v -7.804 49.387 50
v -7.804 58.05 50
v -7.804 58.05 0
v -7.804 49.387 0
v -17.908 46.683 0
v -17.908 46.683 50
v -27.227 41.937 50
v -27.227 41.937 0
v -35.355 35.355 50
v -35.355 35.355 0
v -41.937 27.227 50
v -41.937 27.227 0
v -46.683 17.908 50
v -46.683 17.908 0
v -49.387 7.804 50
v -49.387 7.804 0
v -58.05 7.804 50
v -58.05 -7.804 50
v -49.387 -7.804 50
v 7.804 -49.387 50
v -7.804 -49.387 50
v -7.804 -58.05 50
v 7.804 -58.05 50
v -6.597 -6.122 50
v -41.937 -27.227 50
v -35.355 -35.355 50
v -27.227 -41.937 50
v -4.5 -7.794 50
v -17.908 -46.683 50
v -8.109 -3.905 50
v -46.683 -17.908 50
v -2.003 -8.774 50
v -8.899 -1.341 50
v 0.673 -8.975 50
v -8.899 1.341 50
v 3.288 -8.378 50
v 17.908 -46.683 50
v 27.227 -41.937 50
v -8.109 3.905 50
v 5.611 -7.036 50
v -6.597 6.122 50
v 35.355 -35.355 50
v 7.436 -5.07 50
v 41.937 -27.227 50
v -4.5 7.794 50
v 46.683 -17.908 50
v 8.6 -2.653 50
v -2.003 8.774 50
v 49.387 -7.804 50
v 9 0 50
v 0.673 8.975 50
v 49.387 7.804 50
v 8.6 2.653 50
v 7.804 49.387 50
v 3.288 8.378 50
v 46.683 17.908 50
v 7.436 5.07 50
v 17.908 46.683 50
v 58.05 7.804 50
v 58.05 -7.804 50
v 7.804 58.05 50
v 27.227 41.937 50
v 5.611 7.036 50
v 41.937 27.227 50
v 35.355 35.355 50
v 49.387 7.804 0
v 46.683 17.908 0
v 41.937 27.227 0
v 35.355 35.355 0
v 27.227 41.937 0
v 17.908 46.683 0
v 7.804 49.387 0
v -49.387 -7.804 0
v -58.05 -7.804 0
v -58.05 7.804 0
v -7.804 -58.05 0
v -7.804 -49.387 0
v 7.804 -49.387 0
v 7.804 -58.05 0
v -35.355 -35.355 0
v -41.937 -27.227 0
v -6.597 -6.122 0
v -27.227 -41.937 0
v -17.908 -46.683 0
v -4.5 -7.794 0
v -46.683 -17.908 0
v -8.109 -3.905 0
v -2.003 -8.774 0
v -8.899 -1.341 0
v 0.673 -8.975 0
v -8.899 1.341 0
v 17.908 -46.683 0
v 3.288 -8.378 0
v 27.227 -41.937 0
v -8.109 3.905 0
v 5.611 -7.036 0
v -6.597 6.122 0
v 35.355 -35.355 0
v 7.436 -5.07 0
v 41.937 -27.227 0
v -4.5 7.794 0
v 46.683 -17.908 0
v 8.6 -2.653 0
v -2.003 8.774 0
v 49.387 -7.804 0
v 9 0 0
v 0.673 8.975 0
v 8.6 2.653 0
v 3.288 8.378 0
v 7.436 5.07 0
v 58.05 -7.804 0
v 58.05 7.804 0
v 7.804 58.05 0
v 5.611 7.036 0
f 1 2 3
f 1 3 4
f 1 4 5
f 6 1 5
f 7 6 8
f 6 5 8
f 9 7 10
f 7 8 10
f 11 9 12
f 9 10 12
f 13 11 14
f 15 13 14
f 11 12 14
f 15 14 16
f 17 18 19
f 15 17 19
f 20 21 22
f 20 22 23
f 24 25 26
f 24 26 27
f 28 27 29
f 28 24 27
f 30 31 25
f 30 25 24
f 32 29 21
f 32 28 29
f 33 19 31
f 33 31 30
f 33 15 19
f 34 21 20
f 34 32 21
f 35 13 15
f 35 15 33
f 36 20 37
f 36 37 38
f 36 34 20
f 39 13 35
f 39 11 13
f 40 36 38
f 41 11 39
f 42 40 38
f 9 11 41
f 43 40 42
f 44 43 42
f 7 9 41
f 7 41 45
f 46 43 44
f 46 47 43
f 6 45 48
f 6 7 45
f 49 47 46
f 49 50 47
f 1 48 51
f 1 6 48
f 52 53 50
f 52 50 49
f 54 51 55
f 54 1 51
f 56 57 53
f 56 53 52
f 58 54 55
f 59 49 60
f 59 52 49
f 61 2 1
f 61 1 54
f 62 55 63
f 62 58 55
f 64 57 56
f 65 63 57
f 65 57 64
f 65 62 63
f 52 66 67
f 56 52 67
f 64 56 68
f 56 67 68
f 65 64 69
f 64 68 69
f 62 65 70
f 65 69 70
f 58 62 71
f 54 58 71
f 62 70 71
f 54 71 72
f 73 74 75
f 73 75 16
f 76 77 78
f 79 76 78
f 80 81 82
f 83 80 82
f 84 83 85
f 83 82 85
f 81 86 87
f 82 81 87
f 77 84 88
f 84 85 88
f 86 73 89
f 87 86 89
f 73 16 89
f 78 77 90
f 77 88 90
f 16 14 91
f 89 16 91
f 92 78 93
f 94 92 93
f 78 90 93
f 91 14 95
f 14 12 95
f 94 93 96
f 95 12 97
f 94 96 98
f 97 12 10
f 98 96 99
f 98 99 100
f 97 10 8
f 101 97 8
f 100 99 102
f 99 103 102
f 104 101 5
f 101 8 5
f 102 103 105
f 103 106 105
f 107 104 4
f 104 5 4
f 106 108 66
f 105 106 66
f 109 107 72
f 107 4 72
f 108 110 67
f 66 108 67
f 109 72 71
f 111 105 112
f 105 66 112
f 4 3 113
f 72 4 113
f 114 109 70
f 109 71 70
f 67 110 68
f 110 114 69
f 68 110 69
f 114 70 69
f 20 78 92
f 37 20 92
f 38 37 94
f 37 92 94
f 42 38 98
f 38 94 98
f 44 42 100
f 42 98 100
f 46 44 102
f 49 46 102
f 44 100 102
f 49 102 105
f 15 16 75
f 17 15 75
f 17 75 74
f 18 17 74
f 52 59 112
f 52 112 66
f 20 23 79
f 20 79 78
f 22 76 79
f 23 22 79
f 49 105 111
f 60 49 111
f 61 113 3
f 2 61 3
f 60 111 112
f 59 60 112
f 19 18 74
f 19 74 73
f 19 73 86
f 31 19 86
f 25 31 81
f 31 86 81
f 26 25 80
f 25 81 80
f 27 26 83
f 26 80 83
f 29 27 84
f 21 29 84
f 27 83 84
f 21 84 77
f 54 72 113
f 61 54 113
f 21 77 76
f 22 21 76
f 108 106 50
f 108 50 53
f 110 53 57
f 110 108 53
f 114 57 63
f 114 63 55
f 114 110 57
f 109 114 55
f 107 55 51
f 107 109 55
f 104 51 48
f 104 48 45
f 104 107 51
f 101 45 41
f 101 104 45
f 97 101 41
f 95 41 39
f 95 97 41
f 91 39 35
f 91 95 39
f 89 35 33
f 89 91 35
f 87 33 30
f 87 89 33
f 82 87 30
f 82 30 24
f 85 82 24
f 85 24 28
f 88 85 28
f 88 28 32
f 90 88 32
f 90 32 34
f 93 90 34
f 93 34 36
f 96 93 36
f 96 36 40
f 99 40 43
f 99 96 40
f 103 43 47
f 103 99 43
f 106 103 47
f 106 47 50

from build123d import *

# Parameters (mm, degrees)
F0_R     = 9
F1_DEPTH = 50


with BuildPart() as f1:
    # F0 (on Top) → F1 (new body)
    with BuildSketch(Plane.XY):
        with BuildLine():
            ThreePointArc((49.38715, -7.804448), (49.846552, -3.914237), (50, 0))
            ThreePointArc((50, 0), (49.846552, 3.914237), (49.38715, 7.804448))
            ThreePointArc((49.38715, 7.804448), (35.355339, 35.355339), (7.804448, 49.38715))
            ThreePointArc((7.804448, 49.38715), (0, 50), (-7.804448, 49.38715))
            ThreePointArc((-7.804448, 49.38715), (-35.355339, 35.355339), (-49.38715, 7.804448))
            ThreePointArc((-49.38715, 7.804448), (-50, 0), (-49.38715, -7.804448))
            ThreePointArc((-49.38715, -7.804448), (-35.355339, -35.355339), (-7.804448, -49.38715))
            ThreePointArc((-7.804448, -49.38715), (0, -50), (7.804448, -49.38715))
            ThreePointArc((7.804448, -49.38715), (35.355339, -35.355339), (49.38715, -7.804448))
        make_face()
        Circle(F0_R, mode=Mode.SUBTRACT)
        with BuildLine():
            ThreePointArc((-7.804448, 49.38715), (0, 50), (7.804448, 49.38715))
            Line((7.804448, 49.38715), (7.804448, 58.050208))
            Line((7.804448, 58.050208), (-7.804448, 58.050208))
            Line((-7.804448, 58.050208), (-7.804448, 49.38715))
        make_face()
        with BuildLine():
            ThreePointArc((49.38715, 7.804448), (49.846552, 3.914237), (50, 0))
            ThreePointArc((50, 0), (49.846552, -3.914237), (49.38715, -7.804448))
            Line((49.38715, -7.804448), (58.050208, -7.804448))
            Line((58.050208, -7.804448), (58.050208, 7.804448))
            Line((58.050208, 7.804448), (49.38715, 7.804448))
        make_face()
        with BuildLine():
            Line((7.804448, -58.050208), (7.804448, -49.38715))
            ThreePointArc((7.804448, -49.38715), (0, -50), (-7.804448, -49.38715))
            Line((-7.804448, -49.38715), (-7.804448, -58.050208))
            Line((-7.804448, -58.050208), (7.804448, -58.050208))
        make_face()
        with BuildLine():
            ThreePointArc((-49.38715, -7.804448), (-50, 0), (-49.38715, 7.804448))
            Line((-49.38715, 7.804448), (-58.050208, 7.804448))
            Line((-58.050208, 7.804448), (-58.050208, -7.804448))
            Line((-58.050208, -7.804448), (-49.38715, -7.804448))
        make_face()
    extrude(amount=F1_DEPTH)


solid = f1.part
